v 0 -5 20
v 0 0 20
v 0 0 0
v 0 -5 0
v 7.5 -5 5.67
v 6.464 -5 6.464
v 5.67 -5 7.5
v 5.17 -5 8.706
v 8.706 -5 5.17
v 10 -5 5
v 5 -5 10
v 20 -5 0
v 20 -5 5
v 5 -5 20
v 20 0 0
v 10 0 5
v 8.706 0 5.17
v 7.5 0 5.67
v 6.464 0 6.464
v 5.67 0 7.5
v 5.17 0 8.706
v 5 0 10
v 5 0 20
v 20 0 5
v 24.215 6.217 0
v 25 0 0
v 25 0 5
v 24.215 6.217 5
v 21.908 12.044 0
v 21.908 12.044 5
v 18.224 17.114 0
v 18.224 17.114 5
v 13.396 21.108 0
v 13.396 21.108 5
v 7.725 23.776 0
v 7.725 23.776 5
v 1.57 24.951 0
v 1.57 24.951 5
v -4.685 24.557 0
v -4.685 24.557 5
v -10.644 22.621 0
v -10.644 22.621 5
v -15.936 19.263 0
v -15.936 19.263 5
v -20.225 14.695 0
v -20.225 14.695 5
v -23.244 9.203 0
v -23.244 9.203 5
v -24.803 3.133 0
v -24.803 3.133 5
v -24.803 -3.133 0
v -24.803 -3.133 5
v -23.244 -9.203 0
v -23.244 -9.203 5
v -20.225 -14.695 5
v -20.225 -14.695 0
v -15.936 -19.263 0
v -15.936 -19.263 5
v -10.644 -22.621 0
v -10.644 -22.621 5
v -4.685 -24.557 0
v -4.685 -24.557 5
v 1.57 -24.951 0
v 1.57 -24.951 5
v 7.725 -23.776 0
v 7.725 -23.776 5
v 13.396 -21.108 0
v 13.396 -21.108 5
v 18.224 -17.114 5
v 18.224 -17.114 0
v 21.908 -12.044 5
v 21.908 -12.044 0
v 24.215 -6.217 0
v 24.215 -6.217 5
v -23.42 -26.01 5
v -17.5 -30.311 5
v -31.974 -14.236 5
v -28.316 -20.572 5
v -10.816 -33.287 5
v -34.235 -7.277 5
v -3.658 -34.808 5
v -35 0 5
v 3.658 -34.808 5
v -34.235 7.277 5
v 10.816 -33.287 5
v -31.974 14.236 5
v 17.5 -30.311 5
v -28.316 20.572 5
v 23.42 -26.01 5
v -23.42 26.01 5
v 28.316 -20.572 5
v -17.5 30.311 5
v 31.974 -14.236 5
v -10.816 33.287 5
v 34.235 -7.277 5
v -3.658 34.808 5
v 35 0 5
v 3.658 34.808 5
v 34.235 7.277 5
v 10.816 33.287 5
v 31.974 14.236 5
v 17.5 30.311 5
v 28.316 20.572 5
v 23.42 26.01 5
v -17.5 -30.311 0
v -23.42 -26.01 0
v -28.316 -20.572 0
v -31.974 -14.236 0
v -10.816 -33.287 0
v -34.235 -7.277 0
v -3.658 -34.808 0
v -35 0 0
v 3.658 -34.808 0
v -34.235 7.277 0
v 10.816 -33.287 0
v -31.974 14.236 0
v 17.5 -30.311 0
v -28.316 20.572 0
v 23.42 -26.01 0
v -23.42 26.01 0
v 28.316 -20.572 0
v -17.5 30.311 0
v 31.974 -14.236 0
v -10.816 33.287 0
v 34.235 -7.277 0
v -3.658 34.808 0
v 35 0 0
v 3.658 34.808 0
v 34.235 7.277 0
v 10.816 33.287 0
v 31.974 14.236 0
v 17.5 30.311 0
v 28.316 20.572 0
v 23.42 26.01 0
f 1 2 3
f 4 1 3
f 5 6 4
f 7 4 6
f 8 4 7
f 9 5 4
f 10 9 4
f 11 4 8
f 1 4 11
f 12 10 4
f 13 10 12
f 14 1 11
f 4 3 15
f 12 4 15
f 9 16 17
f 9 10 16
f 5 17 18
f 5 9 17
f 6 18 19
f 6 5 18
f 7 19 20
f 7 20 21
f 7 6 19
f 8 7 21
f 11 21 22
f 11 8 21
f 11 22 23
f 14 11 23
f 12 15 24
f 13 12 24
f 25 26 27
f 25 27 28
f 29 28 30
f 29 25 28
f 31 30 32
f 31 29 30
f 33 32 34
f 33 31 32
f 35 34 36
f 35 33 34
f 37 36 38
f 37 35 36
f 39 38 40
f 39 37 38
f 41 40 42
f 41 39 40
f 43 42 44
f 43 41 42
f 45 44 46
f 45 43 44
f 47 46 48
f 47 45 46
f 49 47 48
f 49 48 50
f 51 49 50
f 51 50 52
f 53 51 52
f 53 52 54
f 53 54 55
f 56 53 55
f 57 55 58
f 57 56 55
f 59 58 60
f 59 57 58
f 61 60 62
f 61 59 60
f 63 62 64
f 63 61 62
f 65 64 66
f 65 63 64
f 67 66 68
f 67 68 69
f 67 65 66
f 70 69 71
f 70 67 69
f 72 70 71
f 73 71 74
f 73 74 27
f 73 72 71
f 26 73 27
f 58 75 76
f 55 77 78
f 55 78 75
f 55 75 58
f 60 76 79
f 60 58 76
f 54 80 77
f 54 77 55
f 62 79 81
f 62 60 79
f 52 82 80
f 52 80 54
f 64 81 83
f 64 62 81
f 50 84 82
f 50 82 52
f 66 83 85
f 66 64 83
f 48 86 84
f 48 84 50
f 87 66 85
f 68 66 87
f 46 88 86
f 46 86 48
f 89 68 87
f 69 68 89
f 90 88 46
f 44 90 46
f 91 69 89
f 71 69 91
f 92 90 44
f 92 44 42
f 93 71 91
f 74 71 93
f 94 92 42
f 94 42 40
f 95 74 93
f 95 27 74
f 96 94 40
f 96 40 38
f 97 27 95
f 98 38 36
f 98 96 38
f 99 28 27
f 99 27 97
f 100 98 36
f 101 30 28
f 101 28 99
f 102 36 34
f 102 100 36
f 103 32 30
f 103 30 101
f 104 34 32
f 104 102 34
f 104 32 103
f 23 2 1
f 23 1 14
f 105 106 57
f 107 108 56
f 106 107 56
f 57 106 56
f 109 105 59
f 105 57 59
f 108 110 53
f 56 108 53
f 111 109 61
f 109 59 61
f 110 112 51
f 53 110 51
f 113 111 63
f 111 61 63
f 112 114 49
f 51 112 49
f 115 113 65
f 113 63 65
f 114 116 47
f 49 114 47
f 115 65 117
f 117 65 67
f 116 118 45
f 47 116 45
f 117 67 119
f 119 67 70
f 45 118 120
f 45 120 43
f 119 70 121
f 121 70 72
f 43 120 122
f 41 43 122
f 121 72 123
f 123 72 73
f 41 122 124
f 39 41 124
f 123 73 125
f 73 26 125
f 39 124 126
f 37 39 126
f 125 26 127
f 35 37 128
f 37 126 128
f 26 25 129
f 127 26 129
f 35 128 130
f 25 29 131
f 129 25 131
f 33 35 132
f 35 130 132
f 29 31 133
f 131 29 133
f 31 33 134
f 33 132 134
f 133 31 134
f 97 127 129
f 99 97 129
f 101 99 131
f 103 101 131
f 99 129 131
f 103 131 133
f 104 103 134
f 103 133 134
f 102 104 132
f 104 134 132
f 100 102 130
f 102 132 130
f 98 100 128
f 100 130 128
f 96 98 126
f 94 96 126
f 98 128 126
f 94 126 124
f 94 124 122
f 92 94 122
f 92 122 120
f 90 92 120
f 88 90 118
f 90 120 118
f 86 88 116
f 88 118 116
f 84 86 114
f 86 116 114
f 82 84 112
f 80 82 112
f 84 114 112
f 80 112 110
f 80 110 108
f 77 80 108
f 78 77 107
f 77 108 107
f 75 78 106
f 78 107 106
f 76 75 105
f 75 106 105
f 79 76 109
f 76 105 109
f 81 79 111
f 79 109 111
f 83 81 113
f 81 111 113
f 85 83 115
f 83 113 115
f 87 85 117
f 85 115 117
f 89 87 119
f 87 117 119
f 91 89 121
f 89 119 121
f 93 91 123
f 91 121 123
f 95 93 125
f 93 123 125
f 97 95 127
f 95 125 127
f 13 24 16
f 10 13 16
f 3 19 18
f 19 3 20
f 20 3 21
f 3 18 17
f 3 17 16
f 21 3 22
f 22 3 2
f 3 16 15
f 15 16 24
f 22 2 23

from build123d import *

# Parameters (mm, degrees)
F0_R     = 35
F0_R_2   = 25
F1_DEPTH = 5
F3_W     = 15
F3_H     = 5
F3_W_2   = 5
F3_H_2   = 15
F4_DEPTH = 5
F5_R     = 5


with BuildPart() as f1:
    # F0 (on Top) → F1 (new body)
    with BuildSketch(Plane.XY):
        Circle(F0_R)
        Circle(F0_R_2, mode=Mode.SUBTRACT)
    extrude(amount=F1_DEPTH)


with BuildPart() as f4:
    # F3 (on Front) → F4 (new body)
    with BuildSketch(Plane.XZ):
        with Locations((12.5, 2.5)):
            Rectangle(F3_W, F3_H)
        with Locations((2.5, 2.5)):
            Rectangle(F3_W_2, F3_H)
        with Locations((2.5, 12.5)):
            Rectangle(F3_W_2, F3_H_2)
    extrude(amount=F4_DEPTH)

    # F5
    f5_edges = [f4.edges().sort_by_distance(p)[0] for p in [
        (5, -2.5, 5),
    ]]
    fillet(f5_edges, radius=F5_R)


solid = Compound([f1.part, f4.part])
